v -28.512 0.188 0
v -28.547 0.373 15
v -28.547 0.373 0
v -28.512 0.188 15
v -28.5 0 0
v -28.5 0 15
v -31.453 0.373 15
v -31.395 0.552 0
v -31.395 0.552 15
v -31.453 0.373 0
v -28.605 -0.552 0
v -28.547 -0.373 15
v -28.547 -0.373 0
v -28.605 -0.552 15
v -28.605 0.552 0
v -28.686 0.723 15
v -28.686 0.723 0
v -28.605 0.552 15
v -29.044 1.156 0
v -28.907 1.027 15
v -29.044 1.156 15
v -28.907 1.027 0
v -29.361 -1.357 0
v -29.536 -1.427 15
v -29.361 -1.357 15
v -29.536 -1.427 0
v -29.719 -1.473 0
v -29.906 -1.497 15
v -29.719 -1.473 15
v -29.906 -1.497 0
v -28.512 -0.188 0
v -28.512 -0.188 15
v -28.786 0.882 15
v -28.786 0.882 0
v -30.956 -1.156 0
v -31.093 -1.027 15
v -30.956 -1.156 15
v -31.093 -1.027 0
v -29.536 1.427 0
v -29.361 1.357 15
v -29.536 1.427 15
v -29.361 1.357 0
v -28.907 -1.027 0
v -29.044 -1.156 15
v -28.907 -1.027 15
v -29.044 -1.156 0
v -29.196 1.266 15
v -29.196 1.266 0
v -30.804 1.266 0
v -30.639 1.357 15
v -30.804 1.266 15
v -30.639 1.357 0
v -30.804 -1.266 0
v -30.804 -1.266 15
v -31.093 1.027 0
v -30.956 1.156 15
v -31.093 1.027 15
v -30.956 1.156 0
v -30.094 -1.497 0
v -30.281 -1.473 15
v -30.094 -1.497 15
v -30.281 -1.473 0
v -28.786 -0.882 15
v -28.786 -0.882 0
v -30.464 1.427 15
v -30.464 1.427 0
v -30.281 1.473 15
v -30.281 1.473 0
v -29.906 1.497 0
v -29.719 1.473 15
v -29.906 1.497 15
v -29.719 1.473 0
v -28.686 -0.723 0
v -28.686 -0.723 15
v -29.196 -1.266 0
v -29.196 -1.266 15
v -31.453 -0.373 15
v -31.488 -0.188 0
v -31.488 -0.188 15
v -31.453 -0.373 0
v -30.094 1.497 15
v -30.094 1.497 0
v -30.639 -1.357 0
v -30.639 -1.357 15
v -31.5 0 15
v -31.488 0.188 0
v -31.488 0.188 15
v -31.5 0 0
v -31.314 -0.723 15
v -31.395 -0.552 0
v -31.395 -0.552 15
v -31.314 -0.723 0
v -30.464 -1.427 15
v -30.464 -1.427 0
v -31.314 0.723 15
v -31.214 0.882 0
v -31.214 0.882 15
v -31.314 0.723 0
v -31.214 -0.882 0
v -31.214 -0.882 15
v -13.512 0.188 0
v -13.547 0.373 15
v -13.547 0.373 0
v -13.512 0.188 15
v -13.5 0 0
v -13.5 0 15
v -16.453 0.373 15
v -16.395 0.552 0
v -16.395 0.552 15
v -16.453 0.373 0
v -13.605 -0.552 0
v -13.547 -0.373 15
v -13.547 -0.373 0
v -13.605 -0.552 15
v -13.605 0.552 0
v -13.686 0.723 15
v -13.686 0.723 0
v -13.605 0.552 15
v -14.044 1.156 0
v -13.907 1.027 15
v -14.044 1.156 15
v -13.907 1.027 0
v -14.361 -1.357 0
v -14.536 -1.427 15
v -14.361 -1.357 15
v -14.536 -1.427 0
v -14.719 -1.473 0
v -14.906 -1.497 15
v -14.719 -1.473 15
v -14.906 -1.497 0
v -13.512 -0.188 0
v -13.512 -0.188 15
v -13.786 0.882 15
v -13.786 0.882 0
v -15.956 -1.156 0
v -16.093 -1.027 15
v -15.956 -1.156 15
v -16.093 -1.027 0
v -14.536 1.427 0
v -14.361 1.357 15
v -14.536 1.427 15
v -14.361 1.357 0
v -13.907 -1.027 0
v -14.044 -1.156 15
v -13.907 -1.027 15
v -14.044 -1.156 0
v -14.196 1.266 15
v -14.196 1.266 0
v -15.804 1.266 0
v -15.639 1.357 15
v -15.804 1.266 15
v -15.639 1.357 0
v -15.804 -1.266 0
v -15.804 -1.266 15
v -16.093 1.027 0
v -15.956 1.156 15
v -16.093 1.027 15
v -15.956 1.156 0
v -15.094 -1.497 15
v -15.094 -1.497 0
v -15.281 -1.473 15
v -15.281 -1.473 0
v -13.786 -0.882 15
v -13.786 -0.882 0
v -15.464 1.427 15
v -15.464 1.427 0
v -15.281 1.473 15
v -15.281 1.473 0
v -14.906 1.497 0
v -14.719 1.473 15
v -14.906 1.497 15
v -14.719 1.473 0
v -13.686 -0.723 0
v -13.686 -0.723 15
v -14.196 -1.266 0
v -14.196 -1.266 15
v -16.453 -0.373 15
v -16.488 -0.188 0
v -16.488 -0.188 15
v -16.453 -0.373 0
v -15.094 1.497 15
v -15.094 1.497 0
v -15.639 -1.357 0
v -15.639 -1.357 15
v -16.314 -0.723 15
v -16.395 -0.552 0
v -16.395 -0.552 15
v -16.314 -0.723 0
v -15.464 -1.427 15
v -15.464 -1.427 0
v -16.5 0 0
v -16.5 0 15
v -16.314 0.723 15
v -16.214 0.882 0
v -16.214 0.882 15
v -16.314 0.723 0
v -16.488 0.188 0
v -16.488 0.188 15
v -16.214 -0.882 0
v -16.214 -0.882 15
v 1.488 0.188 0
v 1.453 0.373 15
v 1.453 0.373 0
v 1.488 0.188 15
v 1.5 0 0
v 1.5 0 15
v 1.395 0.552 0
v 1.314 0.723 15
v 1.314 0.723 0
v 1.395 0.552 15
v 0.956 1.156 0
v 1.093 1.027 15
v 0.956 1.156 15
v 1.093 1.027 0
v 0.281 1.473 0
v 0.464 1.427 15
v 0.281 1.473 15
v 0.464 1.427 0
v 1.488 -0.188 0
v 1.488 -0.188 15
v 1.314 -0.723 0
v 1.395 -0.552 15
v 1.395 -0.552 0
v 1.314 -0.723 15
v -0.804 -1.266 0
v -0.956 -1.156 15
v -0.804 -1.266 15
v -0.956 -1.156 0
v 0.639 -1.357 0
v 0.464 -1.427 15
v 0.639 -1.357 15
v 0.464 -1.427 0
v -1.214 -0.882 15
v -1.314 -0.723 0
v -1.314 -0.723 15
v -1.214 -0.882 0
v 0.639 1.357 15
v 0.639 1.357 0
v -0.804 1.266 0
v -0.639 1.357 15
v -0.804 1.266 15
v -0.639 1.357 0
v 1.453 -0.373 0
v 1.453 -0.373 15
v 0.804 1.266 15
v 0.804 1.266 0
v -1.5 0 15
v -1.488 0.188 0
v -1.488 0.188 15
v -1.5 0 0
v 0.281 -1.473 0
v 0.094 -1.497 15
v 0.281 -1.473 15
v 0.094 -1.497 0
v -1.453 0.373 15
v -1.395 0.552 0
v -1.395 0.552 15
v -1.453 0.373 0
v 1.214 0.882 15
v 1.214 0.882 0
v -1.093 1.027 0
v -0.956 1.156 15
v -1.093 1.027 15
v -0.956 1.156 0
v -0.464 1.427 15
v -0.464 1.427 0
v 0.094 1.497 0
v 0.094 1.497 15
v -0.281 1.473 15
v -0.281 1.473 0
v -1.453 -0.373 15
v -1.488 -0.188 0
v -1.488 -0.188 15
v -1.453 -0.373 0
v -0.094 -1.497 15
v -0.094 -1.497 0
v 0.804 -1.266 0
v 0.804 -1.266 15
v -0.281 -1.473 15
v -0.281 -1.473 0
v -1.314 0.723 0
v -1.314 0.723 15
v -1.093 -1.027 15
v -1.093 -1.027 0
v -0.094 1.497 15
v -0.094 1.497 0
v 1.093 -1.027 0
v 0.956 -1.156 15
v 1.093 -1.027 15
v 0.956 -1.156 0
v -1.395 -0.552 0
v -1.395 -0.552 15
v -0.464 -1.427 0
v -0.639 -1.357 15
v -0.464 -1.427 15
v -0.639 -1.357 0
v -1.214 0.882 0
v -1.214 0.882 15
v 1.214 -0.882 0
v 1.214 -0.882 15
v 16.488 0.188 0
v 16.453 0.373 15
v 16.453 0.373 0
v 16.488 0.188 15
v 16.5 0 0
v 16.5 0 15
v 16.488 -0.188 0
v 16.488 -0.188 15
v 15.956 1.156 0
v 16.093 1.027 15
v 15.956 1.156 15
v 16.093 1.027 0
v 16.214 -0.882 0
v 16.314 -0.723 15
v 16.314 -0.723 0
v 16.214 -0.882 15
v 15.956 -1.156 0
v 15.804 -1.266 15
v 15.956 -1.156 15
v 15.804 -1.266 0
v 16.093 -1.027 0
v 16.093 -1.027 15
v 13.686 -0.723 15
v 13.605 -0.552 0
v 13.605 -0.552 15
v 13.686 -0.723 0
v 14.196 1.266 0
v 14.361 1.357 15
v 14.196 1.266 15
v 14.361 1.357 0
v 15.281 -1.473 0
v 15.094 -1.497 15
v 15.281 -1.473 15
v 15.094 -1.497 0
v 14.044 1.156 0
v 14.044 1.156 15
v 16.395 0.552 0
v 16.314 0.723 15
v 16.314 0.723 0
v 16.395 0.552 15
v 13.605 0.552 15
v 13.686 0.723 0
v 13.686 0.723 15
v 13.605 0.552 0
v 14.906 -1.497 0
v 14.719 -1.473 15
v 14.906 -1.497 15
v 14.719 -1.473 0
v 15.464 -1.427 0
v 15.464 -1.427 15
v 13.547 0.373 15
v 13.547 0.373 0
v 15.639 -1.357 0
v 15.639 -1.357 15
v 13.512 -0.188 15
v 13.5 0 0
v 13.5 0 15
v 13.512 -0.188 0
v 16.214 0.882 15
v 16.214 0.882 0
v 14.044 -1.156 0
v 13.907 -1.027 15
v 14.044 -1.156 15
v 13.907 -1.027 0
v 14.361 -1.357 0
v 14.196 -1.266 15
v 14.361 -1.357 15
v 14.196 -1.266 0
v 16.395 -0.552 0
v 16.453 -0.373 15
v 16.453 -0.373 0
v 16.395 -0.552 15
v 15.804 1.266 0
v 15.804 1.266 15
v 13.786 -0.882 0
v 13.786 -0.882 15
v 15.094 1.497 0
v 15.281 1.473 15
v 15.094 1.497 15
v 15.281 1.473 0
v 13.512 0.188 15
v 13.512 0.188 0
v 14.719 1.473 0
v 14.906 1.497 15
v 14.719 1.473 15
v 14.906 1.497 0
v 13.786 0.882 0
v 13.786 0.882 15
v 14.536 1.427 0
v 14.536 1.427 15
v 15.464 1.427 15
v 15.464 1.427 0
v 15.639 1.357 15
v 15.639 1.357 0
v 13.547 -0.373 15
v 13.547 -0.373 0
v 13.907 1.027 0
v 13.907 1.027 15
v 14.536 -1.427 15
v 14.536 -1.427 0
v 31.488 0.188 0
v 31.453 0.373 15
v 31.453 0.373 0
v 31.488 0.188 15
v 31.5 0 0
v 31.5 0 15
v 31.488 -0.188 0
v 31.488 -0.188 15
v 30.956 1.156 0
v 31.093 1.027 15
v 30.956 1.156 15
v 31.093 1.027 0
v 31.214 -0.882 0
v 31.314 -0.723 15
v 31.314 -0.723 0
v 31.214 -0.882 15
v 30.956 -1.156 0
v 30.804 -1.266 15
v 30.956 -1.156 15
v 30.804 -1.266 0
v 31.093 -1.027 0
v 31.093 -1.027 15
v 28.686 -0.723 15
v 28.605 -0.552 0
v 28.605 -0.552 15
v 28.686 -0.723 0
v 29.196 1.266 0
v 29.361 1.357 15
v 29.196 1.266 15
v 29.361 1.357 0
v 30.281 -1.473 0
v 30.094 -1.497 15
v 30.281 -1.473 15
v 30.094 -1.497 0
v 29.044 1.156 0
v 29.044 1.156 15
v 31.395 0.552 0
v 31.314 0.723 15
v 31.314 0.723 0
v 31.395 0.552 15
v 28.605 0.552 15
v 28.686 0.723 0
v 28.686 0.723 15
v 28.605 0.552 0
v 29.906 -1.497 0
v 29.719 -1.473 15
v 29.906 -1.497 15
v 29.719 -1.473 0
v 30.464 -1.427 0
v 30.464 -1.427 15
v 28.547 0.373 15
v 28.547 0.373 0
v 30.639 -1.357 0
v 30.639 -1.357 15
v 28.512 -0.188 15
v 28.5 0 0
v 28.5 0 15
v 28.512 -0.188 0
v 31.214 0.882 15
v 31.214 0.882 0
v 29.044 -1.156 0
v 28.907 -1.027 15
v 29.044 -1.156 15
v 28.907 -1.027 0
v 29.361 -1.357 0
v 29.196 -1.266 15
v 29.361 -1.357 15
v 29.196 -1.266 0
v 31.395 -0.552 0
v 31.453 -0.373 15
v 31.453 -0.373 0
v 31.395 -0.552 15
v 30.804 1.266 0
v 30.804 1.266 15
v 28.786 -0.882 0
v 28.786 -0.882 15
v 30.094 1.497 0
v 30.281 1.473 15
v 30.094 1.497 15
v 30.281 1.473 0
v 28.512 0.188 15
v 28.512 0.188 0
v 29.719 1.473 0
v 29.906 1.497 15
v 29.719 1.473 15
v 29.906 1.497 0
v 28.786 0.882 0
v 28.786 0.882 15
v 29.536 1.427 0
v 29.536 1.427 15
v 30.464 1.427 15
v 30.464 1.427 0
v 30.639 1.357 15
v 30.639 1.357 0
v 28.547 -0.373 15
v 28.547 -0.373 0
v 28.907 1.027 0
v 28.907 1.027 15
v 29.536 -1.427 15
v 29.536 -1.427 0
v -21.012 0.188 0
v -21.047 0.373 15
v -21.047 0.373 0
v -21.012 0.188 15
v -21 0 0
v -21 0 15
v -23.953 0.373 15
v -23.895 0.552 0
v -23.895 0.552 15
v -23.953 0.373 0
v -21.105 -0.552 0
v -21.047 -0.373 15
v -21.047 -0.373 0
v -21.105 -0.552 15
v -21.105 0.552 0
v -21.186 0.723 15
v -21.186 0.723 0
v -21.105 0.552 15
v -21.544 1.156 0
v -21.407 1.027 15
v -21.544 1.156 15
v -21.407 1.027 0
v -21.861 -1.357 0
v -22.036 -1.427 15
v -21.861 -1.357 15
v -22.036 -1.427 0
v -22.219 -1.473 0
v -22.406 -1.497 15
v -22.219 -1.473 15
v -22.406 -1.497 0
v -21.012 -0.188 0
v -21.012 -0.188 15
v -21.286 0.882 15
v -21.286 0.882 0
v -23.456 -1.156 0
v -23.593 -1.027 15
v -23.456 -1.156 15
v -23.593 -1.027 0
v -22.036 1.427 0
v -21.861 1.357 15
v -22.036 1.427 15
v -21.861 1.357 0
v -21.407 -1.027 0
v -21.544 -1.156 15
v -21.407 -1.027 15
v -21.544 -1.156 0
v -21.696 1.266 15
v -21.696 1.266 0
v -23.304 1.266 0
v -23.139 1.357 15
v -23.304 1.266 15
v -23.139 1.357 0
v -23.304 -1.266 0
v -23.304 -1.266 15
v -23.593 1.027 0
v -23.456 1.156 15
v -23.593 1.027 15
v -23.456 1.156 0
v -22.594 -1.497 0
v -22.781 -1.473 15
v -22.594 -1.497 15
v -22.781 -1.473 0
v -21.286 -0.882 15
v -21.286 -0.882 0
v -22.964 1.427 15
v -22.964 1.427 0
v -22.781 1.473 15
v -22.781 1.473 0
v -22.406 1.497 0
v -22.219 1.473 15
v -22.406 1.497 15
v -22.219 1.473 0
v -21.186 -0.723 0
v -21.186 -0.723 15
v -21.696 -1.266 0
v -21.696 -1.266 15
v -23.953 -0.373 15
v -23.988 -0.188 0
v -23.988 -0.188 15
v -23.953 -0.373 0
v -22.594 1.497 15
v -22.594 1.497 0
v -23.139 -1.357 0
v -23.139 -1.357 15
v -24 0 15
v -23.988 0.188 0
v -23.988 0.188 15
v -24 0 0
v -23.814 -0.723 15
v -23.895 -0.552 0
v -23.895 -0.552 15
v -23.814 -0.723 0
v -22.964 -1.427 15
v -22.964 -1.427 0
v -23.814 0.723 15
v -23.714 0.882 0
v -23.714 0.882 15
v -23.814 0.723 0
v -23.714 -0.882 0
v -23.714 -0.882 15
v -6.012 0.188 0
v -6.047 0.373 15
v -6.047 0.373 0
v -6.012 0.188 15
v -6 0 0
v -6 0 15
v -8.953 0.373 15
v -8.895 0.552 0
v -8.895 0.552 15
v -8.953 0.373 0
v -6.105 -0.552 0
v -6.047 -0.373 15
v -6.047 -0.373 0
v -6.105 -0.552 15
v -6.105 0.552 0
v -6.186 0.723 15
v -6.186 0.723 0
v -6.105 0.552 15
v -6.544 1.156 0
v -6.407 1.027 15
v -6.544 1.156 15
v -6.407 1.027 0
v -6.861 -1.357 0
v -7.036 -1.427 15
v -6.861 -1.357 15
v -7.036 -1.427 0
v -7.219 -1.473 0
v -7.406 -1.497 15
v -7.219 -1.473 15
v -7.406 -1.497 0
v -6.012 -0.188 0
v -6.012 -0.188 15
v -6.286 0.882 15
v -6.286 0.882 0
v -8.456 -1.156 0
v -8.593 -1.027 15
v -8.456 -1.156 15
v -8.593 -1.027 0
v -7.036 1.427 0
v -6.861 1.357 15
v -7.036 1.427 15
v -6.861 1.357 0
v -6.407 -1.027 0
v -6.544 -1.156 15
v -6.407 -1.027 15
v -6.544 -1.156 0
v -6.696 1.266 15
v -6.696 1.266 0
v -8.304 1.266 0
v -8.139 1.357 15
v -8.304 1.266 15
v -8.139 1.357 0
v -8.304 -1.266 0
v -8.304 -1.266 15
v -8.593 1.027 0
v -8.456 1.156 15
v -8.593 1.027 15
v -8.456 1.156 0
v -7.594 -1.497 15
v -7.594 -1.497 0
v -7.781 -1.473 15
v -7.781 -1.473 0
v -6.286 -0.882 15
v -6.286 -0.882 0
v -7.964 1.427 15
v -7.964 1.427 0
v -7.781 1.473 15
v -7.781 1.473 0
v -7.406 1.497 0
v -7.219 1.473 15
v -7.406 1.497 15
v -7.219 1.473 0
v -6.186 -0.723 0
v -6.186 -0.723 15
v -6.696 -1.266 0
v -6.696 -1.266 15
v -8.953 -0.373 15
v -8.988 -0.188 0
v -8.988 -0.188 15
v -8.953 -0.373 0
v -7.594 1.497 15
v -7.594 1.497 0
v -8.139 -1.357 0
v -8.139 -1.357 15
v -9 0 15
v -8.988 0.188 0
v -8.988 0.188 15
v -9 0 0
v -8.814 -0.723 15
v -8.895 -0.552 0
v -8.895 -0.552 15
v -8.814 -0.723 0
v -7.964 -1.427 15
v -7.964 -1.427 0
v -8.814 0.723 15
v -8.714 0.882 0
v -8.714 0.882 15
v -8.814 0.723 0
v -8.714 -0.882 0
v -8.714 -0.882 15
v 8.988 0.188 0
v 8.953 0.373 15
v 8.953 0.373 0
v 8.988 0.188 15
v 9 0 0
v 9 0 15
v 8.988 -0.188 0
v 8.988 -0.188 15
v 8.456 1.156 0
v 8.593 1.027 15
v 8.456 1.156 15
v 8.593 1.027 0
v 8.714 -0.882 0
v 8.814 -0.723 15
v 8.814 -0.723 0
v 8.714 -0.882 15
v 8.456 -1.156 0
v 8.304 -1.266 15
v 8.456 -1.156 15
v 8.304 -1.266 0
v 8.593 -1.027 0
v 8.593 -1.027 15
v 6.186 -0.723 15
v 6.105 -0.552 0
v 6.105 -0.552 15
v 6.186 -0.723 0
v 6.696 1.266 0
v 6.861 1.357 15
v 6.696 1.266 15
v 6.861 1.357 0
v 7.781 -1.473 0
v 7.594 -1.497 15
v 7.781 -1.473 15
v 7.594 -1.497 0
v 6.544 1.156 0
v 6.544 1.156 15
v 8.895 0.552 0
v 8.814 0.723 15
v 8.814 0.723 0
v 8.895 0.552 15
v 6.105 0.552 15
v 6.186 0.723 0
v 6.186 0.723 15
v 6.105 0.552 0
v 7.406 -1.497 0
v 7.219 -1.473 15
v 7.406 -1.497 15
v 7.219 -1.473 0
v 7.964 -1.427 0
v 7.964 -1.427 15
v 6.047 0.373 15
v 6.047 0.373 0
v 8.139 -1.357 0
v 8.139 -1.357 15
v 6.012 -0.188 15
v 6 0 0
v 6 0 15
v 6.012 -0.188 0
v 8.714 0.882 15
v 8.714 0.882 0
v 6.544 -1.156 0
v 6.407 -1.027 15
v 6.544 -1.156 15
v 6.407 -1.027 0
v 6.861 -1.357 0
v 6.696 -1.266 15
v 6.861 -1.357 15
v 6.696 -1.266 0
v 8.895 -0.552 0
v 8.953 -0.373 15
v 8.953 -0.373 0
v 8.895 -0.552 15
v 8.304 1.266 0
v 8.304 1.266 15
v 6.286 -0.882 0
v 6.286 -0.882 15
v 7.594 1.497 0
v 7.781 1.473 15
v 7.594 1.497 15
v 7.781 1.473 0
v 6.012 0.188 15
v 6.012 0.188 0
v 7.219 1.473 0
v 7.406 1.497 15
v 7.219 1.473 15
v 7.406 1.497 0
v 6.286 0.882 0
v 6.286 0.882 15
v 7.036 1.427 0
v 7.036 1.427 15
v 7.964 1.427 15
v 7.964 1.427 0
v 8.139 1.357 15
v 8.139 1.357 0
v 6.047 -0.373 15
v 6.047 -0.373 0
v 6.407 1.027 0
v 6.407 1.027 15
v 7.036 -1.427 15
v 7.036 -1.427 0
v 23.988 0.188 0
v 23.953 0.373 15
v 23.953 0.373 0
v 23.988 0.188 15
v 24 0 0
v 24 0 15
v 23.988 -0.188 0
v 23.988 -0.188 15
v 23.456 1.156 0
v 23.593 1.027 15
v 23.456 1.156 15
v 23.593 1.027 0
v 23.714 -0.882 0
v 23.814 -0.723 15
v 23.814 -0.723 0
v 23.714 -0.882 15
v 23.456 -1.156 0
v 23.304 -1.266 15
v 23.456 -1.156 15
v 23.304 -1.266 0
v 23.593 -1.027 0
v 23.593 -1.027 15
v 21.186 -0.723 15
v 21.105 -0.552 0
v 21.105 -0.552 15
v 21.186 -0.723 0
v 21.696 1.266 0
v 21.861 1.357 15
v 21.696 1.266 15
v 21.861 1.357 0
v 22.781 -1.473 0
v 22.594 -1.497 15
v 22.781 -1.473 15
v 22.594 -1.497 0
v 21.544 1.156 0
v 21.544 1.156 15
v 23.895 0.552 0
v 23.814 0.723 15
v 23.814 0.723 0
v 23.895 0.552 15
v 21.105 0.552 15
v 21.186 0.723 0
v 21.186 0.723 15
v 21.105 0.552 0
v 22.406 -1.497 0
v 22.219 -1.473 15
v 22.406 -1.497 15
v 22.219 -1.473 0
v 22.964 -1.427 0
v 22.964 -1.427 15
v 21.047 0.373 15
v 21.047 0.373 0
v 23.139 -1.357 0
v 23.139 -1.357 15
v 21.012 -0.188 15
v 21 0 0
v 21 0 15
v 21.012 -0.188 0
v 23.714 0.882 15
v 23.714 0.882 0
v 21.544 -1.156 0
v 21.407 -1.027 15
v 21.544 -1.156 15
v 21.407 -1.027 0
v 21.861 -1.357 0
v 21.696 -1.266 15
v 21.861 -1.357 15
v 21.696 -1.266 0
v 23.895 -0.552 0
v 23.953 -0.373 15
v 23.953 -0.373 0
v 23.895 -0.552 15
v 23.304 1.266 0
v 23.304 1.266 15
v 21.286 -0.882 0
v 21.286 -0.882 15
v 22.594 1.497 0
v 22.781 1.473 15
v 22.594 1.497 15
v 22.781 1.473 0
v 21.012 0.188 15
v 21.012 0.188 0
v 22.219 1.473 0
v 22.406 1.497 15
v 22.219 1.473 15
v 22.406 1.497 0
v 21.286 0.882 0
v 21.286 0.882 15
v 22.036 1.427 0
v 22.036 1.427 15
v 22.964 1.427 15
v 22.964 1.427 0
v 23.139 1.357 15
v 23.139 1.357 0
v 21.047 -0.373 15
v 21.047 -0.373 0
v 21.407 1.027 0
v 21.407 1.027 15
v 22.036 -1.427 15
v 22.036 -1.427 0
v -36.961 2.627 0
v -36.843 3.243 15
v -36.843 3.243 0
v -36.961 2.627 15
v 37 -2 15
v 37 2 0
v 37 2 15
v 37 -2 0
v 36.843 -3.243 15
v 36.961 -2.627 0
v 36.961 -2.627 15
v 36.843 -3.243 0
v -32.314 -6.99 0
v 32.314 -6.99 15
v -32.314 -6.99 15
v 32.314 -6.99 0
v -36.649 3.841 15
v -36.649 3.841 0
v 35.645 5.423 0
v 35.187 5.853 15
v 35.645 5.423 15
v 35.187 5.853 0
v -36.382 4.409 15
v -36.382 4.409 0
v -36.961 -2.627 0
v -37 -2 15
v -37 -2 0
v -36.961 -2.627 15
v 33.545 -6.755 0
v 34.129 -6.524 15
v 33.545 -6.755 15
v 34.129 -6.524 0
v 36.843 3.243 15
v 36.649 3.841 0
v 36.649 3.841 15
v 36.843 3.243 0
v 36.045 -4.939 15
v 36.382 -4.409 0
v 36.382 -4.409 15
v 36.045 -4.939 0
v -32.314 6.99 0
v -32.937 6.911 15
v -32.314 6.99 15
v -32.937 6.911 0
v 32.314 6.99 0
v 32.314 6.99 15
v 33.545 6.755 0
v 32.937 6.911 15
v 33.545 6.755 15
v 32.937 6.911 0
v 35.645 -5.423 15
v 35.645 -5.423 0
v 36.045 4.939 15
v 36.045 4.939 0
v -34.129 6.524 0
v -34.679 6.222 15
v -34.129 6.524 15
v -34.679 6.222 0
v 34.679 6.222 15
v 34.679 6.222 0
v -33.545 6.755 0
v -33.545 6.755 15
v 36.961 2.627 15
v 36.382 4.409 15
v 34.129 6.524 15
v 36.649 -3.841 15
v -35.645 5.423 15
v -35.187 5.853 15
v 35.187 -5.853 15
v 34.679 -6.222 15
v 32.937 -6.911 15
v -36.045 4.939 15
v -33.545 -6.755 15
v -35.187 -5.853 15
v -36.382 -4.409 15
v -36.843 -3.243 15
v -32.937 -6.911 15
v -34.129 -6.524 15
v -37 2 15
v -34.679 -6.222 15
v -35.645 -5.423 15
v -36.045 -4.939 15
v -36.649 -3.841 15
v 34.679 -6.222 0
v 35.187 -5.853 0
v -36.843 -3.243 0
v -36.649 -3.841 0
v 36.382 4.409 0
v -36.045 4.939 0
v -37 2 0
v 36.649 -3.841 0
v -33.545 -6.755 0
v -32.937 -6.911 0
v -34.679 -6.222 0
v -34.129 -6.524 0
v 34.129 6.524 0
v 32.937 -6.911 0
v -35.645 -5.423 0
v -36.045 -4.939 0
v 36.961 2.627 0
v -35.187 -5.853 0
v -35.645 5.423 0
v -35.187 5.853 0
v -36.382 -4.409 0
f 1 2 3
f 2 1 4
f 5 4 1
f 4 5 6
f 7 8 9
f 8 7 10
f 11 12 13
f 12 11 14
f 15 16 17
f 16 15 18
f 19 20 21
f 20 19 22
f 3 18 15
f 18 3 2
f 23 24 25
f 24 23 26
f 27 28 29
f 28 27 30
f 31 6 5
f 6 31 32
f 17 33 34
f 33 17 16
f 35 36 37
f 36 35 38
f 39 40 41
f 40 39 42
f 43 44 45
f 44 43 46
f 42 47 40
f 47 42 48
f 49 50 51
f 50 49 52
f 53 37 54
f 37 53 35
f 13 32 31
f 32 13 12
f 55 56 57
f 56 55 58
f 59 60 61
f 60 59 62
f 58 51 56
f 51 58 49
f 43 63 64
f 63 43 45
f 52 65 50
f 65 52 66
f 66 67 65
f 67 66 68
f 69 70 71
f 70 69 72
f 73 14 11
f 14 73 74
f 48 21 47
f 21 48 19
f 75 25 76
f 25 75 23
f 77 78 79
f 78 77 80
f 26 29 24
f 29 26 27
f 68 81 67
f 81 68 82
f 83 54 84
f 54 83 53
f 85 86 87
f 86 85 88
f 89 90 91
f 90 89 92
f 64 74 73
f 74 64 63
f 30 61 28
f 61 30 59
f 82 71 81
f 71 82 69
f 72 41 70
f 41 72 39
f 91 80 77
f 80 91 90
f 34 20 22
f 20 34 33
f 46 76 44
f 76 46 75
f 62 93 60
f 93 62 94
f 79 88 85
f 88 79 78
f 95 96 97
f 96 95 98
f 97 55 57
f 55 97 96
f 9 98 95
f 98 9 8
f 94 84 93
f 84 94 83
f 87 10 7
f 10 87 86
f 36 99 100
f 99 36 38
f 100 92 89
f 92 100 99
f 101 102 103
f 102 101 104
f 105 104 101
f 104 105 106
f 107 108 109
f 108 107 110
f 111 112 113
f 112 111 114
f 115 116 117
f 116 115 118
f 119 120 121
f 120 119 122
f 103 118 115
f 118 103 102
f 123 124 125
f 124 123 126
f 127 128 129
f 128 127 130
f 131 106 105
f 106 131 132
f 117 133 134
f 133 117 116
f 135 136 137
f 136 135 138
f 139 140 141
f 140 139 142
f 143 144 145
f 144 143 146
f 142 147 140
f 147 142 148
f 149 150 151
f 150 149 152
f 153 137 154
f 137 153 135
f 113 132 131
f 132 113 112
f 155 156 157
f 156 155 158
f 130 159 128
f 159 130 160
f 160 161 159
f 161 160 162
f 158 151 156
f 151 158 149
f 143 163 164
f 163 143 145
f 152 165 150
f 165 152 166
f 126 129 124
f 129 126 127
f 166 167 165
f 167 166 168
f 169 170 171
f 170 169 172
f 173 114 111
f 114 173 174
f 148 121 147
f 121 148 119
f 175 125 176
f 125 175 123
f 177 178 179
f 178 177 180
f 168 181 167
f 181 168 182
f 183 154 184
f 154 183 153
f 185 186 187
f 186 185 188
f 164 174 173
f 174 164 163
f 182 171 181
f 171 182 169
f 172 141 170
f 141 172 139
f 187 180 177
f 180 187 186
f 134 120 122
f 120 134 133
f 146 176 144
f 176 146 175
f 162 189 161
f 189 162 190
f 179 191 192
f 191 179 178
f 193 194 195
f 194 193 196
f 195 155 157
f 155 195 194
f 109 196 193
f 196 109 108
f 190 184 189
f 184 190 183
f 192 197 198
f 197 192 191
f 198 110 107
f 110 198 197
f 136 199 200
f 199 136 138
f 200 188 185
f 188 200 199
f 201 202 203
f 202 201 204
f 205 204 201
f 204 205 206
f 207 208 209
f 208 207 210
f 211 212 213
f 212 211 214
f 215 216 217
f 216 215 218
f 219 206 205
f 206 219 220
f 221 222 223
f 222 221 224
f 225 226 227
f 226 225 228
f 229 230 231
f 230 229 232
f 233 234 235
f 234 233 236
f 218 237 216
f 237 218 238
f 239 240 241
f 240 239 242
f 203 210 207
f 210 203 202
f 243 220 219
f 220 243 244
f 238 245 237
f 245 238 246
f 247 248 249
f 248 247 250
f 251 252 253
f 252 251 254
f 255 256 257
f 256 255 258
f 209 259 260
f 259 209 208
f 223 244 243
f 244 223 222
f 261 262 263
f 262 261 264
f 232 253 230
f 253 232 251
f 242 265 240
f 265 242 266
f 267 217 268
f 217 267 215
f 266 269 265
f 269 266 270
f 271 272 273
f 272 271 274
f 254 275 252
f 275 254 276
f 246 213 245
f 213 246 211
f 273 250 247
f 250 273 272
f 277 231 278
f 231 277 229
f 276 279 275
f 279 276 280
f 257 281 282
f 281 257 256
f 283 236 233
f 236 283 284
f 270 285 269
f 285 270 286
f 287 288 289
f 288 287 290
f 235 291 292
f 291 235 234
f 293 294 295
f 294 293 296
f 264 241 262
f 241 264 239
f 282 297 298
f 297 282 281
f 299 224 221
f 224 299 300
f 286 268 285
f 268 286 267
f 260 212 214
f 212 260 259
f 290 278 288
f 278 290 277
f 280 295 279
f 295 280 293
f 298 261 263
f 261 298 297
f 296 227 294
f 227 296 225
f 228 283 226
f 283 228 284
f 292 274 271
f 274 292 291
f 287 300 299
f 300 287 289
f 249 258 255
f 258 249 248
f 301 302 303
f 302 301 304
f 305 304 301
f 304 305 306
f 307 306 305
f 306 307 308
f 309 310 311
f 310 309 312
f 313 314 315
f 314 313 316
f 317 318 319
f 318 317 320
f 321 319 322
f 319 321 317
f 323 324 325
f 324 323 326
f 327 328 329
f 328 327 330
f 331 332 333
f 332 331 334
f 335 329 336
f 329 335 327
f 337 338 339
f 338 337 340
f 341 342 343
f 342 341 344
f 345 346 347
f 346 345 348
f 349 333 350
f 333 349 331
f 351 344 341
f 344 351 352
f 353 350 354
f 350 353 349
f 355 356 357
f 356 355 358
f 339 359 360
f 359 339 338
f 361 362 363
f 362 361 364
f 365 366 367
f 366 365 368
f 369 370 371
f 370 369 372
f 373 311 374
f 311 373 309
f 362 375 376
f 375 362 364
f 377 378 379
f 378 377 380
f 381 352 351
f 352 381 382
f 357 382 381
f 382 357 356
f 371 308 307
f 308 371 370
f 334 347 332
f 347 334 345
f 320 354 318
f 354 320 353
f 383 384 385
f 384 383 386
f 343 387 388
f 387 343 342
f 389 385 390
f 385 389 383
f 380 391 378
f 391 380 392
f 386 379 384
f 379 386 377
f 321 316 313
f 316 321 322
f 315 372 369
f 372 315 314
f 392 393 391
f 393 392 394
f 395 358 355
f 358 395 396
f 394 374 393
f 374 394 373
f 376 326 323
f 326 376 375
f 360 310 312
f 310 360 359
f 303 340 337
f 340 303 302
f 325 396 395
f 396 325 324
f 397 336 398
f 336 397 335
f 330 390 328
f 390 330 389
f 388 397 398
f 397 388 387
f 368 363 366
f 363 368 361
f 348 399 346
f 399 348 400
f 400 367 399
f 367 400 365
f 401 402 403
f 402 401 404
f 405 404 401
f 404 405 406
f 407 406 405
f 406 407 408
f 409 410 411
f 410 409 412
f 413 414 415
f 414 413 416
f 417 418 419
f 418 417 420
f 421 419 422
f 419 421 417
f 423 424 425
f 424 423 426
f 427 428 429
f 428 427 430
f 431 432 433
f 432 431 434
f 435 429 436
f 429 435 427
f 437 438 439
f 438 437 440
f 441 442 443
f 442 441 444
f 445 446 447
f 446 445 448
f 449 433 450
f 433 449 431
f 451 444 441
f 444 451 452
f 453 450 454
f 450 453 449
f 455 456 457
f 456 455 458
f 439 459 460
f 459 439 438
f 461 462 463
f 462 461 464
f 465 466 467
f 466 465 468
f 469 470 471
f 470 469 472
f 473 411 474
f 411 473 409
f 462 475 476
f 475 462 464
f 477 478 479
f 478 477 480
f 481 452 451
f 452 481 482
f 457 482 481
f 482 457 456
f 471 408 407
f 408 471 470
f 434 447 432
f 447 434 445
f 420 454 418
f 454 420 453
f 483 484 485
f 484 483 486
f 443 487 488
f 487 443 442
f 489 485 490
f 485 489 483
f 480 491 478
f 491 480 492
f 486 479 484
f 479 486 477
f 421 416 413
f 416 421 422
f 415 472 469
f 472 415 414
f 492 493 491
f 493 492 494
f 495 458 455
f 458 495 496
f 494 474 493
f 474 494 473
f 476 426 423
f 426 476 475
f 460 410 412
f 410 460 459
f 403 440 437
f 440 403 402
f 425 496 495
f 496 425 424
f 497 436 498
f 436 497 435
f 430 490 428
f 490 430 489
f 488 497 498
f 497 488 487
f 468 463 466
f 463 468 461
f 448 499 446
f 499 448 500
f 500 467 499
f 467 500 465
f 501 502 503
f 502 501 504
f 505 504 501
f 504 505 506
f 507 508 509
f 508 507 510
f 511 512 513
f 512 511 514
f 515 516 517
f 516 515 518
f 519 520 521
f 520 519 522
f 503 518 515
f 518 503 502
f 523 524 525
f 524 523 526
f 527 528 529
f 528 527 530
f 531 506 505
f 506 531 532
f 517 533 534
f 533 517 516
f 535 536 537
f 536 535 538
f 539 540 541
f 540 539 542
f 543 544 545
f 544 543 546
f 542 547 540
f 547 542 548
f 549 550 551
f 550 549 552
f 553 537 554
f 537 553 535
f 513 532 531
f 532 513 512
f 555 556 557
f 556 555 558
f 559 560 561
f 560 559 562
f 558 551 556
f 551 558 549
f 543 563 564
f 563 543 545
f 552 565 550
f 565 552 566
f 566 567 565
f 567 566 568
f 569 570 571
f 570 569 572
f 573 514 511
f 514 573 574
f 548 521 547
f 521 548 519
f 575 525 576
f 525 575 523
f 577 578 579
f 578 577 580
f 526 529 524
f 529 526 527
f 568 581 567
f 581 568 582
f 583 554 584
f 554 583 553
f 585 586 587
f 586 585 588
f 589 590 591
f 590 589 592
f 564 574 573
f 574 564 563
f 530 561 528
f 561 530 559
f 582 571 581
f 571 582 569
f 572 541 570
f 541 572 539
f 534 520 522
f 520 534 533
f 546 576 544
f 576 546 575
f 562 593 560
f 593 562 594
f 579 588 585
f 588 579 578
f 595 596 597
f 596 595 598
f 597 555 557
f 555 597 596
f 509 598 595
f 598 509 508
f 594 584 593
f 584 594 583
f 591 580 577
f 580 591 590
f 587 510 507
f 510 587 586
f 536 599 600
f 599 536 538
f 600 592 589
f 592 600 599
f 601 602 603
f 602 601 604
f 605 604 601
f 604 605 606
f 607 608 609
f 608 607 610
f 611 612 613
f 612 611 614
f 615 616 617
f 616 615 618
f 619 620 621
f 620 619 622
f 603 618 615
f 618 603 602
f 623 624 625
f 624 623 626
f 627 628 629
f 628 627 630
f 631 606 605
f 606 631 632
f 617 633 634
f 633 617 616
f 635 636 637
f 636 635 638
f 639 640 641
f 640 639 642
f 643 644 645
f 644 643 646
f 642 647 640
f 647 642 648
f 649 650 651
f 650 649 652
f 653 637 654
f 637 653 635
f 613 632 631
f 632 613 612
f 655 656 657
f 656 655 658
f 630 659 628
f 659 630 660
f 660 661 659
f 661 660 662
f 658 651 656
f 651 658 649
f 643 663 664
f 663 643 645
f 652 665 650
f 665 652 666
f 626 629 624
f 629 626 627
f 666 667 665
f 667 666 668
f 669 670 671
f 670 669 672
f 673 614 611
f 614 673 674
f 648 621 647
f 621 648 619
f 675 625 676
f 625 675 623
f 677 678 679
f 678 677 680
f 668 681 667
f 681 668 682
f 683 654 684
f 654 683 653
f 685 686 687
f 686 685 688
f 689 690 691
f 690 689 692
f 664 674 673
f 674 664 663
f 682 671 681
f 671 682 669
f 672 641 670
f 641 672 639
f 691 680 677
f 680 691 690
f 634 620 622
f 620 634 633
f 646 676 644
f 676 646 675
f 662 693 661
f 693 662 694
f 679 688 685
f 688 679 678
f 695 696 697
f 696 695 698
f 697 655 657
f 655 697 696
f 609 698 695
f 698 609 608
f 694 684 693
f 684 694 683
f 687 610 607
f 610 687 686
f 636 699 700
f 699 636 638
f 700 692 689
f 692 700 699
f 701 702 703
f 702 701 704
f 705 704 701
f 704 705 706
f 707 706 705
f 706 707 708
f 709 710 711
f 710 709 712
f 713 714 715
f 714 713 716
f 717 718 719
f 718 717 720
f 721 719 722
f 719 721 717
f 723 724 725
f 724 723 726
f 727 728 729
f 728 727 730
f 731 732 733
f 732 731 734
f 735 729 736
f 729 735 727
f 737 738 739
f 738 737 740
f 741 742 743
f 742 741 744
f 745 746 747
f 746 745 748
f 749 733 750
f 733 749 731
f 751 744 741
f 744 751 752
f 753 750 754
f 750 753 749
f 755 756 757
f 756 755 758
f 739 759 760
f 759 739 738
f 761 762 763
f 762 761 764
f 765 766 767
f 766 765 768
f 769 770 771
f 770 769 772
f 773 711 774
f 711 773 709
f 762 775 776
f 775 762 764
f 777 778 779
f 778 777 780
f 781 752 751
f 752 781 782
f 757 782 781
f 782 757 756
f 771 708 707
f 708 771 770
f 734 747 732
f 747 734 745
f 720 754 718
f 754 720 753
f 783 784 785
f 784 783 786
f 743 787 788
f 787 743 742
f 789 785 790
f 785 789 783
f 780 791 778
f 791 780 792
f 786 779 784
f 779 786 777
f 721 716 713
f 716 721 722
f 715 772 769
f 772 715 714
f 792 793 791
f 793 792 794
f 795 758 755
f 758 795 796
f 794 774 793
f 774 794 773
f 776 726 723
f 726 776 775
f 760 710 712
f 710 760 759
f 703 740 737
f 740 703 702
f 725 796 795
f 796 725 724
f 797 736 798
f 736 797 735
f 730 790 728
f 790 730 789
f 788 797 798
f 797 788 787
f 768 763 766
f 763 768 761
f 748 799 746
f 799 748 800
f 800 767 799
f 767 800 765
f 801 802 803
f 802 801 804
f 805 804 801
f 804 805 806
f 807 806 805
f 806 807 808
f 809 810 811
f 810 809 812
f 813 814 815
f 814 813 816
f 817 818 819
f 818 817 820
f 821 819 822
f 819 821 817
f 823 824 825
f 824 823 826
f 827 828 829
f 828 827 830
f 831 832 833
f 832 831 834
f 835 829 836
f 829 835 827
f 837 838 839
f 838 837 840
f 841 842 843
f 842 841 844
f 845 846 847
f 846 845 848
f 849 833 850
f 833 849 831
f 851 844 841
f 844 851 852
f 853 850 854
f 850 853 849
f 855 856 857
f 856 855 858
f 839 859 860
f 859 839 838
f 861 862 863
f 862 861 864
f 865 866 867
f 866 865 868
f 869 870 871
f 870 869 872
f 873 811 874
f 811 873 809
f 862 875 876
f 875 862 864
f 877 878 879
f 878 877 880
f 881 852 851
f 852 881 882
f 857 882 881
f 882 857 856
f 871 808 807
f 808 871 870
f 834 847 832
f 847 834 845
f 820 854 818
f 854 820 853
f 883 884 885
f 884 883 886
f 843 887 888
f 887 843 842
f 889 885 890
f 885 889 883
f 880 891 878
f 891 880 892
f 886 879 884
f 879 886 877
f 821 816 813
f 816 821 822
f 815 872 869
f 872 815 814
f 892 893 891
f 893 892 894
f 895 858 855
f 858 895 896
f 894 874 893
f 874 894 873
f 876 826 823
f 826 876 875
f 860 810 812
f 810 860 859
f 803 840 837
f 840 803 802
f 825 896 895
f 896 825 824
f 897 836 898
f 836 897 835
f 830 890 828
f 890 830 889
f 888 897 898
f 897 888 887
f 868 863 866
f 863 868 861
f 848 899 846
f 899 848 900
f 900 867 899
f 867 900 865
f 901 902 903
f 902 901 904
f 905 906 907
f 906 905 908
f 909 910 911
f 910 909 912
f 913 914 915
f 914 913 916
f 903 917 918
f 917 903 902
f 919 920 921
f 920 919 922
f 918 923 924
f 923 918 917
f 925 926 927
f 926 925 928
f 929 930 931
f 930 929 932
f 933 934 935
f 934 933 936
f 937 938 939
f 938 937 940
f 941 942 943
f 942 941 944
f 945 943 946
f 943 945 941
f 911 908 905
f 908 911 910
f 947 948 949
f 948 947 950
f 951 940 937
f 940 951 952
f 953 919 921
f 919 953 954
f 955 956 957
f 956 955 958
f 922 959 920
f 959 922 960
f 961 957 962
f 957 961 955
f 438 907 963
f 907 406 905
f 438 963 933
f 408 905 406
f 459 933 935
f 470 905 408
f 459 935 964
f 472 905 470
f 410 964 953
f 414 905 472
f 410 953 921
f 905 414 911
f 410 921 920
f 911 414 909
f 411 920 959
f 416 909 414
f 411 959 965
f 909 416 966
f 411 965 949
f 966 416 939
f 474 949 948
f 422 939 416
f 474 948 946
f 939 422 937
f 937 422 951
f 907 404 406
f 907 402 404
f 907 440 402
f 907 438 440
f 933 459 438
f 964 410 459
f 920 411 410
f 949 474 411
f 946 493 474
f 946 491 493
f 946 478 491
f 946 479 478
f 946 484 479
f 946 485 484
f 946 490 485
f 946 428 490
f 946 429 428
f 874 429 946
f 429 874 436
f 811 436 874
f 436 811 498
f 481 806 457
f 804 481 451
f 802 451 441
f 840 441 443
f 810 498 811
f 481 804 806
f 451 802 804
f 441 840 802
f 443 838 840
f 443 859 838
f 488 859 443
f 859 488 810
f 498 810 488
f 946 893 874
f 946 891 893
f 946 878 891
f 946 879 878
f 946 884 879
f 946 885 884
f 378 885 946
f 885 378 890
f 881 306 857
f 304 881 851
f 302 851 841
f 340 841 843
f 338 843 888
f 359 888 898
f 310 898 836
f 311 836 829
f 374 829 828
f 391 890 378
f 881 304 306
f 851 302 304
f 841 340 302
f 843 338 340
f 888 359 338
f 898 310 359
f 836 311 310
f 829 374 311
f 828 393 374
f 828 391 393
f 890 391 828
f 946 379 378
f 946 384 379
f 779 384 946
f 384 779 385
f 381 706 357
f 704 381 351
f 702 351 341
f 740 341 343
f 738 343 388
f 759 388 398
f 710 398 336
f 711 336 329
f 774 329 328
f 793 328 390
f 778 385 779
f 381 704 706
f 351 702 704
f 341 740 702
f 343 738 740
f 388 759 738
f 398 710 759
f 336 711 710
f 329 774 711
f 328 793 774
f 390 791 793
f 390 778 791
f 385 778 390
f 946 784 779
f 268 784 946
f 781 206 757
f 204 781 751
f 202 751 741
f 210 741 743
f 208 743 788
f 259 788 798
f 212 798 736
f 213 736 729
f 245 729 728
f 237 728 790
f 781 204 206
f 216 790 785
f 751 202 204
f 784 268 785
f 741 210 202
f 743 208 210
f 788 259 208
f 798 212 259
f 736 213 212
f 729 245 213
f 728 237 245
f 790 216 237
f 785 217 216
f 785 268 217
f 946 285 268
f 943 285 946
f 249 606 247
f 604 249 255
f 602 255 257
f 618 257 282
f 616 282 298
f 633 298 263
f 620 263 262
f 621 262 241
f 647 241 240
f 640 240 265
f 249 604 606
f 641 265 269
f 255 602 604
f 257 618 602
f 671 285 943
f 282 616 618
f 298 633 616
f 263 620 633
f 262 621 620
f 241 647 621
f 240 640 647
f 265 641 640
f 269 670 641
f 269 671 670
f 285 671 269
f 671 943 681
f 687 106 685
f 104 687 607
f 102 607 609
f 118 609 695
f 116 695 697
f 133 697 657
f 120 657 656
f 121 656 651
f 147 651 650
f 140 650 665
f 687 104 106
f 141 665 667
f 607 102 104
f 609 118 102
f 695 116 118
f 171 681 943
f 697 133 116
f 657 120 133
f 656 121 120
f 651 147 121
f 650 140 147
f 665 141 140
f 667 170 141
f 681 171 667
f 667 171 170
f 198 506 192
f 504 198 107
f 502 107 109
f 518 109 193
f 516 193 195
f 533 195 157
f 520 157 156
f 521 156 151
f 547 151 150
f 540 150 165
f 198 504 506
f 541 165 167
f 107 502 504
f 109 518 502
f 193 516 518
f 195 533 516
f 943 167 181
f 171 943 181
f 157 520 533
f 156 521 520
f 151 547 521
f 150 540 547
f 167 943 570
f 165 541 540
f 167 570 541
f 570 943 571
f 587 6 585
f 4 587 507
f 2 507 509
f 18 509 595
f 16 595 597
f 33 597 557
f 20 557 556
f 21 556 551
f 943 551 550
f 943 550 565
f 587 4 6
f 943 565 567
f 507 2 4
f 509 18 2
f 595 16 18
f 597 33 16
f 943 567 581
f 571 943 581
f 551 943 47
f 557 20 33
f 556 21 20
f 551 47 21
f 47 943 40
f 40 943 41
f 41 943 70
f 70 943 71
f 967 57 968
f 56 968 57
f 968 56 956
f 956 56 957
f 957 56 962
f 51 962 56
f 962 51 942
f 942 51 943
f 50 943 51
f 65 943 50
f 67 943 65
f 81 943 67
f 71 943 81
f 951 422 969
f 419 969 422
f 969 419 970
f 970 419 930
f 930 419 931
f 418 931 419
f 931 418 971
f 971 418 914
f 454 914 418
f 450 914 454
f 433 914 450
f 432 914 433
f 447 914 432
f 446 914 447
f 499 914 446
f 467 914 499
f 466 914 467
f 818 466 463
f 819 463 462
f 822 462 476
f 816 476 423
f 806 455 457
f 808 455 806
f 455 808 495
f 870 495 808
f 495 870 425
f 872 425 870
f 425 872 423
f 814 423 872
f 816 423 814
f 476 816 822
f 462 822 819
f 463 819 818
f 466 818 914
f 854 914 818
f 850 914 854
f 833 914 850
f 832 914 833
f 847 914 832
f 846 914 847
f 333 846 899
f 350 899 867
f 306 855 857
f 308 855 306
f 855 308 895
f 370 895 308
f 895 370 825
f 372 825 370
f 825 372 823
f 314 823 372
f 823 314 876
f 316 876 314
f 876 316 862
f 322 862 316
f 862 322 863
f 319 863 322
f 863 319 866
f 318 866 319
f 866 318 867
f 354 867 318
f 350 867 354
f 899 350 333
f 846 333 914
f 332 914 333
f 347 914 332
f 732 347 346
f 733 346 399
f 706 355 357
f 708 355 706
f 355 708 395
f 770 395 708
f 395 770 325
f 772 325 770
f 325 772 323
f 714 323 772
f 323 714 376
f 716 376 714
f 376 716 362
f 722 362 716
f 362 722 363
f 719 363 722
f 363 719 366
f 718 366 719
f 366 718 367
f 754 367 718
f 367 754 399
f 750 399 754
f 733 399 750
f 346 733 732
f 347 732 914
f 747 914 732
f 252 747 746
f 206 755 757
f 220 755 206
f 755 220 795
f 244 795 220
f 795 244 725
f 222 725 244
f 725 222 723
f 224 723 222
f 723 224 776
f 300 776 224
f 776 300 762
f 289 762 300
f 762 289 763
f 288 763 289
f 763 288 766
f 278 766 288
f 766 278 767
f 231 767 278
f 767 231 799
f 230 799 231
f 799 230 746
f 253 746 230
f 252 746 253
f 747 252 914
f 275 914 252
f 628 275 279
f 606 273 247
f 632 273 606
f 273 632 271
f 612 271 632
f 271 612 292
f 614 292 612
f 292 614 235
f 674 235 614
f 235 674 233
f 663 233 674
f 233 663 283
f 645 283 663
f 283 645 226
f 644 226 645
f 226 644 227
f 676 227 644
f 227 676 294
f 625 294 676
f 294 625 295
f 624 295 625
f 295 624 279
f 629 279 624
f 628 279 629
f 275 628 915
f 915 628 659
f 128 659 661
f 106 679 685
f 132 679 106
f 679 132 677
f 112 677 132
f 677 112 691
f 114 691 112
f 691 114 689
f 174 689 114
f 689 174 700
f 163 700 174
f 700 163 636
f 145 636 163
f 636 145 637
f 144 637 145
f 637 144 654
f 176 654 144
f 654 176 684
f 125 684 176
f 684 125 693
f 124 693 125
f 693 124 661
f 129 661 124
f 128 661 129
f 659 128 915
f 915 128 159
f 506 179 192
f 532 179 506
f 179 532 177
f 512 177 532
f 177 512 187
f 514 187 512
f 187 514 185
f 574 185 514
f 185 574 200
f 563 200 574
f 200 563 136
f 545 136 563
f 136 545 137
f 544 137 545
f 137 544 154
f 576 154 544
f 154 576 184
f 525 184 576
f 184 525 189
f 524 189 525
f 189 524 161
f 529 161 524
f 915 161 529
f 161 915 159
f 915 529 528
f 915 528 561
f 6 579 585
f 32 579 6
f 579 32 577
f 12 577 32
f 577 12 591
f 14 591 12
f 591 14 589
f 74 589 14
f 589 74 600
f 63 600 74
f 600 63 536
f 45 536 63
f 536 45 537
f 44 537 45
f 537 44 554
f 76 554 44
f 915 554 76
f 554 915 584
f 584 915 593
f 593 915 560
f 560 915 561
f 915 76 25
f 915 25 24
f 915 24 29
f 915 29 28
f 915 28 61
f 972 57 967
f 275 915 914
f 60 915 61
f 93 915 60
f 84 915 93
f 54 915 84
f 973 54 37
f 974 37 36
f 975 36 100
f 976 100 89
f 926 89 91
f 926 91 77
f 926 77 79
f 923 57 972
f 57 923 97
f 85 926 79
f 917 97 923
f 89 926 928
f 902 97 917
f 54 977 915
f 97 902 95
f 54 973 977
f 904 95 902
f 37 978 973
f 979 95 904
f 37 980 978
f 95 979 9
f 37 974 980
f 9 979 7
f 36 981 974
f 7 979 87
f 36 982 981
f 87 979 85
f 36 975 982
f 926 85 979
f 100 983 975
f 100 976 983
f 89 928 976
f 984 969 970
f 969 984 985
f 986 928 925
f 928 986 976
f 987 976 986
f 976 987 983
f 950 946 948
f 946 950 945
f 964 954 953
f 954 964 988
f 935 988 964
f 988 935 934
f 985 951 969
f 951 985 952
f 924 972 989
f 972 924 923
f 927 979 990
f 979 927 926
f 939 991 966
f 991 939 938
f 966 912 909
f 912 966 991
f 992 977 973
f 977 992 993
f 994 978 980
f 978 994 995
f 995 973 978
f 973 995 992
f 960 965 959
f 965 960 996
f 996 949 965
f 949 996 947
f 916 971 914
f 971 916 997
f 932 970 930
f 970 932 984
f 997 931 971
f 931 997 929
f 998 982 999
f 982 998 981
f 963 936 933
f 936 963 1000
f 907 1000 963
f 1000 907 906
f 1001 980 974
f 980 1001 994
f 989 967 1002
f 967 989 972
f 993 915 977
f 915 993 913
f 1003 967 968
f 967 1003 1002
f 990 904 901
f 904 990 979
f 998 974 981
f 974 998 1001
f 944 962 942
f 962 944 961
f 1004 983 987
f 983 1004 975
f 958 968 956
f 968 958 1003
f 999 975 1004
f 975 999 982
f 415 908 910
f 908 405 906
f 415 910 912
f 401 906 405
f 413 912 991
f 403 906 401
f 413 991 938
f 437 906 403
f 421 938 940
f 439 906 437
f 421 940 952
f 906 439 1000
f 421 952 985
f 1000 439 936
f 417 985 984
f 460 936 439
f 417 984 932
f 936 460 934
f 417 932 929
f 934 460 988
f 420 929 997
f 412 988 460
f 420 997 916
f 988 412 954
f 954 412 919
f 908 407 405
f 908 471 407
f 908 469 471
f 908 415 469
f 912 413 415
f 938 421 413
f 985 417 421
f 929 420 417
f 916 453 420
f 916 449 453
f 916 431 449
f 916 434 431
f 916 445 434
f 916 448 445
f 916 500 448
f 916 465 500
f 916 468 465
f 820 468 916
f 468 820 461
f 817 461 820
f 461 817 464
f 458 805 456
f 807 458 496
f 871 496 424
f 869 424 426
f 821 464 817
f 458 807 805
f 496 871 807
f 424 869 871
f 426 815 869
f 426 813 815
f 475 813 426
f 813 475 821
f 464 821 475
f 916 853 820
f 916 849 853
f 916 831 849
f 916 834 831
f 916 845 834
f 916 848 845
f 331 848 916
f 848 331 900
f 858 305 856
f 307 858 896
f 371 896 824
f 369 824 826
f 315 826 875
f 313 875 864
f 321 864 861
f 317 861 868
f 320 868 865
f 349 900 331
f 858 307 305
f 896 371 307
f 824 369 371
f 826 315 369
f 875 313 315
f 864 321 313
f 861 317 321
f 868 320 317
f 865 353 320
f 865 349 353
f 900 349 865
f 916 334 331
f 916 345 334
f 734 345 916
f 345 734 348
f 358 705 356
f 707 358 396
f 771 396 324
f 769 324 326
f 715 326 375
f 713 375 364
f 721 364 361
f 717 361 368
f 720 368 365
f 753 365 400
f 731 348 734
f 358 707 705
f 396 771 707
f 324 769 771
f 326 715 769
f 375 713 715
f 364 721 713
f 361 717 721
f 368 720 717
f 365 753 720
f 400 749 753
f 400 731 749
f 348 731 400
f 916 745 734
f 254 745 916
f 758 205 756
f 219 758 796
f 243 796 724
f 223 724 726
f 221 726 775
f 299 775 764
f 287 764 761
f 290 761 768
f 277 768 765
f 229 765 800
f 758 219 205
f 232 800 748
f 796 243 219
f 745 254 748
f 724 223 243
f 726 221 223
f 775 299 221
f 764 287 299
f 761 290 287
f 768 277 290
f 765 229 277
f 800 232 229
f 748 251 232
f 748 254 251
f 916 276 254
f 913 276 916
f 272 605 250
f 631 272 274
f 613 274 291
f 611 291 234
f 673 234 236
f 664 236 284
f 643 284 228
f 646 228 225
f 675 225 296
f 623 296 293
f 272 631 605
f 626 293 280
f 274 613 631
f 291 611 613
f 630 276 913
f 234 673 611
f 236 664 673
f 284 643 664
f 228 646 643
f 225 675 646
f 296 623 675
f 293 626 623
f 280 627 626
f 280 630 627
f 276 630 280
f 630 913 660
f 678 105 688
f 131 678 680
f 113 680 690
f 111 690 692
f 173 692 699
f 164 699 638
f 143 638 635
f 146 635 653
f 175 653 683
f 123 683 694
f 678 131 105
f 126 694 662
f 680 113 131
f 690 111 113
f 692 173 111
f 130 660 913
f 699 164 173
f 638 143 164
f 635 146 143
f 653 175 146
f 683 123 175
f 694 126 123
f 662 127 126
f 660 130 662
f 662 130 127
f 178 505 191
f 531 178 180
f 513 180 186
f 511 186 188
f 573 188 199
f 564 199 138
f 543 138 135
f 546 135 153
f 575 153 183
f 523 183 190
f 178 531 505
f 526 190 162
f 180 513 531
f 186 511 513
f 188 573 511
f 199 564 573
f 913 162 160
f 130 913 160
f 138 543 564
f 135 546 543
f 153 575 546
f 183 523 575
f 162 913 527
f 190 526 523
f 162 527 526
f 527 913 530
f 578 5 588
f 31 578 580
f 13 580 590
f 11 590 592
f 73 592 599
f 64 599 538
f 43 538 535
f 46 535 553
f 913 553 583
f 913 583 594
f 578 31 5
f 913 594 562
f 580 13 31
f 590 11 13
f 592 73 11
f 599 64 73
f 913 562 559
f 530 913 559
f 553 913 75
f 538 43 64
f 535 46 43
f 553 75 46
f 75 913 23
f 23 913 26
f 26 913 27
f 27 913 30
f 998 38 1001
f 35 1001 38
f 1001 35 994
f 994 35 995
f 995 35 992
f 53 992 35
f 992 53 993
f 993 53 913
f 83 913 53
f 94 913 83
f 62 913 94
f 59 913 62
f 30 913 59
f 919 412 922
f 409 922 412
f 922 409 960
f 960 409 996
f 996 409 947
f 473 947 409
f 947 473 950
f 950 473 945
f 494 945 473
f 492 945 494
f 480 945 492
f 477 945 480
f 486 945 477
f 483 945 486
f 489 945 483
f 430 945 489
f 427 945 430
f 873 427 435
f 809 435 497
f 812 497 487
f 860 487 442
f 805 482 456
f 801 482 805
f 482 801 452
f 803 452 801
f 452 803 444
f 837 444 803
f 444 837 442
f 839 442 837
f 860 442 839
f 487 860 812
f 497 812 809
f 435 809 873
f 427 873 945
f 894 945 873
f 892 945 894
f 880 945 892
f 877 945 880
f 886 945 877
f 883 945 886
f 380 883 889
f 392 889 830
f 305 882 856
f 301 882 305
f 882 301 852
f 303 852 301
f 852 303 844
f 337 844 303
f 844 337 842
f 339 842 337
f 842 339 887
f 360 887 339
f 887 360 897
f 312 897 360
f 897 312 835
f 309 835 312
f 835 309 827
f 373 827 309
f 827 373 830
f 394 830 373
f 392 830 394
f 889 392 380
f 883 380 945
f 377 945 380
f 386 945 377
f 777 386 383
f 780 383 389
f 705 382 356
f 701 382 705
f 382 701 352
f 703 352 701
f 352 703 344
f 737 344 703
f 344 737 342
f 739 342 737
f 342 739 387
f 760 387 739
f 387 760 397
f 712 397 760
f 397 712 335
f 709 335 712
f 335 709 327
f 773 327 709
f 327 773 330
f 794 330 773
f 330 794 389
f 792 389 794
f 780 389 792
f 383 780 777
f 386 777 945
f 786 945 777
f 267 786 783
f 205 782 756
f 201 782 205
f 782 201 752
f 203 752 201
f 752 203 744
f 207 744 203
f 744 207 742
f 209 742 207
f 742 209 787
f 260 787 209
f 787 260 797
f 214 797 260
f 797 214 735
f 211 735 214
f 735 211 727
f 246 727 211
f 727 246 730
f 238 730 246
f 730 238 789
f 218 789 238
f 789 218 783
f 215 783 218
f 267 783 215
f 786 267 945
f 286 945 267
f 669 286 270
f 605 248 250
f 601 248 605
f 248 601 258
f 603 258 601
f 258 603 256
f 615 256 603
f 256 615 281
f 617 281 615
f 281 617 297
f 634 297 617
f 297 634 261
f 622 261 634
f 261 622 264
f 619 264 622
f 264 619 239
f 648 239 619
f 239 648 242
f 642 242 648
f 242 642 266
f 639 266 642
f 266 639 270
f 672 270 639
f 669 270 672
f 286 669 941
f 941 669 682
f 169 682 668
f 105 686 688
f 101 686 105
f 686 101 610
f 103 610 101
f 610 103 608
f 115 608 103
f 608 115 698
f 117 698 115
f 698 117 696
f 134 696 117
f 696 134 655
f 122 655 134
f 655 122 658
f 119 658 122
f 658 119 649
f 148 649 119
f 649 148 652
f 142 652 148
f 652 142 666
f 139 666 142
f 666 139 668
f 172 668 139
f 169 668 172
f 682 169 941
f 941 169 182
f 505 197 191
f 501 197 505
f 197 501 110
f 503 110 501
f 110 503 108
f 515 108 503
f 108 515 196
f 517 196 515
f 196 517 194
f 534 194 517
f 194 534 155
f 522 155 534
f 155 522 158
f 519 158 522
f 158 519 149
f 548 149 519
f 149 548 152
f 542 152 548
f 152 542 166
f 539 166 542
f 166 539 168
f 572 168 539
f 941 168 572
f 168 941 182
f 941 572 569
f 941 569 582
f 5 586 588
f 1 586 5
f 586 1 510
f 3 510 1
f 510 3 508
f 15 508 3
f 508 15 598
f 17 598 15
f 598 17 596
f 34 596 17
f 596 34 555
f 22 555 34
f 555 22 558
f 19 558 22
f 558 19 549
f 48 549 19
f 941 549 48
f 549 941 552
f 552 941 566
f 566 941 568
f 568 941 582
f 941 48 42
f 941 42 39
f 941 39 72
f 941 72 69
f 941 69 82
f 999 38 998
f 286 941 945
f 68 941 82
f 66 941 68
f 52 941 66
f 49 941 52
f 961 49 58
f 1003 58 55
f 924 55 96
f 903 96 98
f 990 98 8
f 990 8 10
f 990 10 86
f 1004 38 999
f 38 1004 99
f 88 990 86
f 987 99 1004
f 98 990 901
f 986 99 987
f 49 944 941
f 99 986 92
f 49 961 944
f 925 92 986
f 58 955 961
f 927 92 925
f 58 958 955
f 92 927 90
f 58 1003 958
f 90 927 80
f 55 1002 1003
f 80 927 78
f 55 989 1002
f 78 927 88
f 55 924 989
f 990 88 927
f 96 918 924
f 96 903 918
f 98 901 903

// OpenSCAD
$fn = 50;


difference() {
	union() {
		hull() {
			translate(v = [-32.0000000000, 2.0000000000, 0]) {
				cylinder(h = 15, r = 5);
			}
			translate(v = [32.0000000000, 2.0000000000, 0]) {
				cylinder(h = 15, r = 5);
			}
			translate(v = [-32.0000000000, -2.0000000000, 0]) {
				cylinder(h = 15, r = 5);
			}
			translate(v = [32.0000000000, -2.0000000000, 0]) {
				cylinder(h = 15, r = 5);
			}
		}
	}
	union() {
		translate(v = [-30.0000000000, 0.0000000000, 0]) {
			translate(v = [0, 0, -100]) {
				cylinder(h = 200, r = 1.5000000000);
			}
		}
		translate(v = [-15.0000000000, 0.0000000000, 0]) {
			translate(v = [0, 0, -100]) {
				cylinder(h = 200, r = 1.5000000000);
			}
		}
		translate(v = [0, 0, -100]) {
			cylinder(h = 200, r = 1.5000000000);
		}
		translate(v = [15.0000000000, 0.0000000000, 0]) {
			translate(v = [0, 0, -100]) {
				cylinder(h = 200, r = 1.5000000000);
			}
		}
		translate(v = [30.0000000000, 0.0000000000, 0]) {
			translate(v = [0, 0, -100]) {
				cylinder(h = 200, r = 1.5000000000);
			}
		}
		translate(v = [-30.0000000000, 0.0000000000, 0]) {
			translate(v = [0, 0, -100]) {
				cylinder(h = 200, r = 1.5000000000);
			}
		}
		translate(v = [-22.5000000000, 0.0000000000, 0]) {
			translate(v = [0, 0, -100]) {
				cylinder(h = 200, r = 1.5000000000);
			}
		}
		translate(v = [-15.0000000000, 0.0000000000, 0]) {
			translate(v = [0, 0, -100]) {
				cylinder(h = 200, r = 1.5000000000);
			}
		}
		translate(v = [-7.5000000000, 0.0000000000, 0]) {
			translate(v = [0, 0, -100]) {
				cylinder(h = 200, r = 1.5000000000);
			}
		}
		translate(v = [0, 0, -100]) {
			cylinder(h = 200, r = 1.5000000000);
		}
		translate(v = [7.5000000000, 0.0000000000, 0]) {
			translate(v = [0, 0, -100]) {
				cylinder(h = 200, r = 1.5000000000);
			}
		}
		translate(v = [15.0000000000, 0.0000000000, 0]) {
			translate(v = [0, 0, -100]) {
				cylinder(h = 200, r = 1.5000000000);
			}
		}
		translate(v = [22.5000000000, 0.0000000000, 0]) {
			translate(v = [0, 0, -100]) {
				cylinder(h = 200, r = 1.5000000000);
			}
		}
		translate(v = [30.0000000000, 0.0000000000, 0]) {
			translate(v = [0, 0, -100]) {
				cylinder(h = 200, r = 1.5000000000);
			}
		}
	}
}
